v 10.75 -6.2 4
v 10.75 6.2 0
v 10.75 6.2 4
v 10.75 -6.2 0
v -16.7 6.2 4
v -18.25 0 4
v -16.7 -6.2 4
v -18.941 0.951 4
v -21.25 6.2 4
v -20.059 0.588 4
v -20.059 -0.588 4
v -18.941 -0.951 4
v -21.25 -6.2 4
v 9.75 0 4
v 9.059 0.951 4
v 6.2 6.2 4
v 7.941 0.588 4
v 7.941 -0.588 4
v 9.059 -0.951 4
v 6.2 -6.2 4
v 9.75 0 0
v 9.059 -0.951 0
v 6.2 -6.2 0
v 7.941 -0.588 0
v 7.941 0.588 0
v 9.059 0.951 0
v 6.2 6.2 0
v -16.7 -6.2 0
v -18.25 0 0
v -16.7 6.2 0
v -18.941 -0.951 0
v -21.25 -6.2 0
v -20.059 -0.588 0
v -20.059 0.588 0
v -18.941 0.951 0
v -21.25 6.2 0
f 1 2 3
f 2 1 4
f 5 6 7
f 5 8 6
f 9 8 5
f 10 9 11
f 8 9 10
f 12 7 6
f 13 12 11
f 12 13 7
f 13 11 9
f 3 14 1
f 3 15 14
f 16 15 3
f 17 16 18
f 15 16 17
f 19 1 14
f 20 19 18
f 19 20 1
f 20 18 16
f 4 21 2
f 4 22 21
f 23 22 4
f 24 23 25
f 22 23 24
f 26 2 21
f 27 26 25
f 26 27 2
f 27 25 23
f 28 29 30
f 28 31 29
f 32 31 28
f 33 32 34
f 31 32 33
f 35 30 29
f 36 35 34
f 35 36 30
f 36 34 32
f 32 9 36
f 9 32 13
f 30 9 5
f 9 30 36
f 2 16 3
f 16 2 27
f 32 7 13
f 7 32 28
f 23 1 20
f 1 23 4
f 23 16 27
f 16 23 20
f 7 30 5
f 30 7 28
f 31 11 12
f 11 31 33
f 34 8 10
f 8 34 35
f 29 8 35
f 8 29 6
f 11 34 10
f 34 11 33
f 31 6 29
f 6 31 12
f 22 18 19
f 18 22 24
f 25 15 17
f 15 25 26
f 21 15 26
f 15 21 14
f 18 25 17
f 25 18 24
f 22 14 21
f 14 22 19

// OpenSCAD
// file: ../buildvars.scad
function cube_size() = 56;
function tolerance() = 0.2;
function screw_r() = 3/2;
function arm_width() = 7;
function arm_length() = 35;
function servo_base_height() = 4;
function servo_elevation() = 5;
function gear_r() = 11;
function arm_c2c() = gear_r()*2.35;

function arm_inset_x() = arm_width() + 2;
function arm_inset_y() = gear_r()+arm_width();

function back_x() = 4.31*2;
function back_y() = -gear_r()-10;
function base_rounding_radius() = 7;
function nut_h() = 2.3;

function grip_pad_h() = servo_base_height();

function back_h() = nut_h()+servo_elevation()+2*servo_base_height();
function gripper_r() = back_h()/2;
function turn_h() = 30;
function turn_gap_h() = 5;
function turn_gap_d() = 2;
function turn_br() = base_rounding_radius();
function turn_sr() = turn_br()/2;
function turn_mr() = (turn_br()+turn_sr())/2;
function turn_pad() = 2;
function turn_gear_r() = 6;



function sh_r() = 8/2;
function sh_h() = 3;
function sh_w() = 10;


function holder_h() = 80; // height to center
function holder_d() = turn_h();
function holder_th() = 8;
function holder_w() = gripper_r()*2+holder_th()*2;
function holder_dst() = 183;


function gears_c2c() = 36;
function gear_conversion_factor() = 1; // old = 0.67;
function gear_round() = true;

function base_r() = (gears_c2c()-3)/2;
function servo_gear_f() = 2/(gear_conversion_factor()+1)*gear_conversion_factor();
function turn_gear_f() = 2-servo_gear_f();
function turn_gear_r() = base_r() * turn_gear_f();
function servo_gear_r() = base_r() * servo_gear_f();

function rail_sep_w() = sh_w()/4;
// main file
use <../buildvars.scad>

function servo_w() = 22.5;
function servo_d() = 12;
function servo_h() = 22;
function servo_w2() = 32;
function servo_r() = servo_d()/2;
function servo_flap() = (servo_w2() -servo_w()) /2;
function servo_short() = servo_r();
function servo_long() = servo_w()-servo_short();
function servo_short2() = servo_short()+servo_flap();
function servo_long2() = servo_long()+servo_flap();

module servo_support(w = 0, ext=0) {
    h = 4;
    d = servo_w2() - servo_w();
    translate([-servo_w()+servo_r()-d/2,-servo_d()/2,0])
    //cube([servo_w(),servo_d(),servo_h()]);
    difference() {
        translate([0,-w-tolerance(),0])
        cube([servo_w2()+ext,servo_d()+w*2+tolerance()*2,h]);
        translate([(servo_w2()-servo_w())/2,0,0])
        translate([-tolerance(),-tolerance(),0])
        cube([servo_w()+tolerance()*2,servo_d()+tolerance()*2,h]);
        translate([2,servo_d()/2,0]) cylinder(h=9,r=1,center=true);
        translate([servo_w2()-2,servo_d()/2,0]) cylinder(h=9,r=1,center=true);
    }
}

module servo_screws() {
    h = 4;
    d = servo_w2() - servo_w();
    color("red")
    translate([-servo_w()+servo_r()-d/2,-servo_d()/2,0])  {
        translate([2,servo_d()/2,0]) cylinder(h=4,r=1);
        translate([servo_w2()-2,servo_d()/2,0]) cylinder(h=4,r=1);
    }
}
servo_screws();

!servo_support();
servo();
module servo() {
    w = servo_w();
    d = servo_d();
    h = servo_h();
    w2 = servo_w2();
    r = servo_r();
    r2 = 5/2;
    mr = 4.5/2;
    translate(-[w-r,d/2,15.5+2.5]) {
        color("Blue") {
            cube([w,d,h]);
        
            translate([-(w2-w)/2,0,15.5]) {
                difference() {
                    cube([w2,d,2.5]);
                    translate([2,d/2,0])
                    cylinder(h=5,r=1,center=true);
                    translate([w2-2,d/2,0])
                    cylinder(h=50,r=1,center=true);
                }
            }
            translate([w-r,d/2,h]) cylinder(h=4,r=r);
            translate([w-r*2,d/2,h]) cylinder(h=4,r=r2);
        }
        color("White") translate([w-r,d/2,h+4]) cylinder(h=3,r=mr);
    }
}
//servo();
